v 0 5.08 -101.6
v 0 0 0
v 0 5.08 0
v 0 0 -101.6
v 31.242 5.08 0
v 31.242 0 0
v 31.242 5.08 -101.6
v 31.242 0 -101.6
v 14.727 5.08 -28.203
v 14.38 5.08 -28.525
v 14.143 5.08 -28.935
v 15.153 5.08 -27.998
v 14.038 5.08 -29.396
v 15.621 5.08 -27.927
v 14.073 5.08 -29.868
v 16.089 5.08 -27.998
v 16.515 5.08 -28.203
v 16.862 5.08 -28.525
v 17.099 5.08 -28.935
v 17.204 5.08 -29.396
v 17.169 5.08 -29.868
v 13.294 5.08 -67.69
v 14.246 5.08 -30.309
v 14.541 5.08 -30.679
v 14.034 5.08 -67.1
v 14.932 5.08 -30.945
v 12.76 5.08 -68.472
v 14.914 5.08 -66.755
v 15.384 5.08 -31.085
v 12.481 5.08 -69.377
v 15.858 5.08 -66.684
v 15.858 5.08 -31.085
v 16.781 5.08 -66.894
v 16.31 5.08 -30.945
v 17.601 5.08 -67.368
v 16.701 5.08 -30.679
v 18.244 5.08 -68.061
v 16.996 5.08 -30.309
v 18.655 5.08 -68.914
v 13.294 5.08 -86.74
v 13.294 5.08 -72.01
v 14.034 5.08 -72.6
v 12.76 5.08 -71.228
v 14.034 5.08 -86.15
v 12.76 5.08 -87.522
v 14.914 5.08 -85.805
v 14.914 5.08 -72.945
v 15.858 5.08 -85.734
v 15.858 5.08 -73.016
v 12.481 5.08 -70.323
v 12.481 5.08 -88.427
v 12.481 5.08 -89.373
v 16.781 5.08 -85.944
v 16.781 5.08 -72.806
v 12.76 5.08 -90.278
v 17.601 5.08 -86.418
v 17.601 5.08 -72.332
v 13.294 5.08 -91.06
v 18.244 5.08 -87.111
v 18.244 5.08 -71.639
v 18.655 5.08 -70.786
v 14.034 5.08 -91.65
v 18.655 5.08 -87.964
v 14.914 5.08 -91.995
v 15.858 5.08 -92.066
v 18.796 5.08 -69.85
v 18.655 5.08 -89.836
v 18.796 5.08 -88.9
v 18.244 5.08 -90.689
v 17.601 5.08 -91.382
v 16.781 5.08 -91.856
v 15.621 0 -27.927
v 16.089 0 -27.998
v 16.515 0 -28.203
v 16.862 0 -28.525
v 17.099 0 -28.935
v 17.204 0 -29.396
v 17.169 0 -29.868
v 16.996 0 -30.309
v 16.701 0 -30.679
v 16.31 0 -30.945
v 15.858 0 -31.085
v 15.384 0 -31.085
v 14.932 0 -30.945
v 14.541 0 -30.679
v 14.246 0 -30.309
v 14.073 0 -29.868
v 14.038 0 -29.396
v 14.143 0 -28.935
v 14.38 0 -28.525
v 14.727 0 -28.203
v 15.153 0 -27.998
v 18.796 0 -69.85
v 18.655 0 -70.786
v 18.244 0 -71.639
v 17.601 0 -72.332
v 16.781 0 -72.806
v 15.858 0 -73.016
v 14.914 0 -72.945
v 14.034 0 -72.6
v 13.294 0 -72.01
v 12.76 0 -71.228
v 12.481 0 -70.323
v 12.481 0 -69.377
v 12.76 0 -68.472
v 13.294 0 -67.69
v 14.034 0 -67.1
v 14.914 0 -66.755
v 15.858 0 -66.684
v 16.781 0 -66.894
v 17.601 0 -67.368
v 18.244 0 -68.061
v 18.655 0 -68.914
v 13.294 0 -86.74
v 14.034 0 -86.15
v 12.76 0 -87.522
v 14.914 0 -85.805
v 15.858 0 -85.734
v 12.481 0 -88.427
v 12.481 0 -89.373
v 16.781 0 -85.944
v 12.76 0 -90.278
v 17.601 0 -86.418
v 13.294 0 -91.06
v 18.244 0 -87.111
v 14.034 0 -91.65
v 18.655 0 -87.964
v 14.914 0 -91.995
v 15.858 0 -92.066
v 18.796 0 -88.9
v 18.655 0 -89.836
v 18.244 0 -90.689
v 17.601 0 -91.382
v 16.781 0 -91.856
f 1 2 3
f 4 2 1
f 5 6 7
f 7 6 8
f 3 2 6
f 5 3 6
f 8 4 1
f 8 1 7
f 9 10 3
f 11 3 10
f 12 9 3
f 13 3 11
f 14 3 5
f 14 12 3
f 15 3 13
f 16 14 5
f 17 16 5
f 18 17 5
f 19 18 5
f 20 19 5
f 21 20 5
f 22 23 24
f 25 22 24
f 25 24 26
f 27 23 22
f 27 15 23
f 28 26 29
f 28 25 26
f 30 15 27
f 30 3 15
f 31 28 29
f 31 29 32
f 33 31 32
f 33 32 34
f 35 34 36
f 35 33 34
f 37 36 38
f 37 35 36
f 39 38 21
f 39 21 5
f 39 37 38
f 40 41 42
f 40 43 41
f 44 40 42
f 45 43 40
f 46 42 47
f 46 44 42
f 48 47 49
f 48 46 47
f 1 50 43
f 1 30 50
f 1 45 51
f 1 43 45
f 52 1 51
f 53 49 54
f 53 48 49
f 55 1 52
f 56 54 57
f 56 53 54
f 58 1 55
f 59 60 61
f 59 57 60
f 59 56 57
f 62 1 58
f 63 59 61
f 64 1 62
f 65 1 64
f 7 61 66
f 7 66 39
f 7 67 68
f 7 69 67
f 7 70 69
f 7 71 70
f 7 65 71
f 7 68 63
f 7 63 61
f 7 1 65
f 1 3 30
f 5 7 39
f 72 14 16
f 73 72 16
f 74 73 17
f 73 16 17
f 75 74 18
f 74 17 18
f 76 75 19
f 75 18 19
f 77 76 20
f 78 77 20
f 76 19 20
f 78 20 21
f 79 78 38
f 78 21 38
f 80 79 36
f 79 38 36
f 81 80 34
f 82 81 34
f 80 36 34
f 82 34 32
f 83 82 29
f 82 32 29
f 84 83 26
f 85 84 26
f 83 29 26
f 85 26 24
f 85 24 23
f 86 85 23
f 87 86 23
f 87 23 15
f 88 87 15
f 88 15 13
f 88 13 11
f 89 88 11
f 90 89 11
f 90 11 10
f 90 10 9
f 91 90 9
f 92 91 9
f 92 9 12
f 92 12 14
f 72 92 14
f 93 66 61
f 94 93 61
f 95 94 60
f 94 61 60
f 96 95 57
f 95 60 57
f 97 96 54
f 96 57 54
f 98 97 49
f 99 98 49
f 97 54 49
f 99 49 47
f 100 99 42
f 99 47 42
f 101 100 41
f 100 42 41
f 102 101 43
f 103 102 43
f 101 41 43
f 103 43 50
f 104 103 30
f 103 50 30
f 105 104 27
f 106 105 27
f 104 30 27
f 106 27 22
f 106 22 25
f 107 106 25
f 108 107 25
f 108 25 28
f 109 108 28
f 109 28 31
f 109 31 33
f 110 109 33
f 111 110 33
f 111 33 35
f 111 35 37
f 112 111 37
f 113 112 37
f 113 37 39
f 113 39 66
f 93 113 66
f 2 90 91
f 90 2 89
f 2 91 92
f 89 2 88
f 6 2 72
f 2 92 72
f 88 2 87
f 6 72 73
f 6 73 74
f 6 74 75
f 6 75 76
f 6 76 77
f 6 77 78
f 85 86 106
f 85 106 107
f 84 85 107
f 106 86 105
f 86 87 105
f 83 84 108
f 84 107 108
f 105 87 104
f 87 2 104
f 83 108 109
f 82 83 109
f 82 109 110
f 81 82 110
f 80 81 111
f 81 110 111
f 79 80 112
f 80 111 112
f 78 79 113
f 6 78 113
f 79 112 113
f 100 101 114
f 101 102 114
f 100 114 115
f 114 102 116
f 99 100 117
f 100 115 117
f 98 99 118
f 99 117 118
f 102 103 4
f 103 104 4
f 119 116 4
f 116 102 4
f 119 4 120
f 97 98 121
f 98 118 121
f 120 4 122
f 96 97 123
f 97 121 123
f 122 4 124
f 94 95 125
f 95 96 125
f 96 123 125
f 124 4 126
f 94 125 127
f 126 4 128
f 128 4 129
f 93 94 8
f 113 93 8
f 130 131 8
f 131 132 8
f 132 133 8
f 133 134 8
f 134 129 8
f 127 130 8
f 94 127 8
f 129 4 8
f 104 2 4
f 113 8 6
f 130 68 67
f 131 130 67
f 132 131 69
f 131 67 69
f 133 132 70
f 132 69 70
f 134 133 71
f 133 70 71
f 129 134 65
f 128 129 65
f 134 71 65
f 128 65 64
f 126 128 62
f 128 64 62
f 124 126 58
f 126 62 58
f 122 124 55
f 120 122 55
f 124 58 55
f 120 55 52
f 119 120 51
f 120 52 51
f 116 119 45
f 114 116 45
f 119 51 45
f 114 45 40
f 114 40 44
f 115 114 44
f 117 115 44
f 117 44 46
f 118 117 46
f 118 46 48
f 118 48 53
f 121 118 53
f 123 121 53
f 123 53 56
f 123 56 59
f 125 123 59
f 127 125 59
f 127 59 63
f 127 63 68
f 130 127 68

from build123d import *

# Parameters (mm, degrees)
SKETCH1_W                   = 31.242
SKETCH1_H                   = 101.6
BOSS_EXTRUDE1_DEPTH         = 5.08
F_1_4_0_25_DIAMETER_HOLE1_D = 6.35
F_1_8_0_1250_DOWEL_HOLE1_D  = 3.175


with BuildPart() as part:
    # Sketch1 → Boss-Extrude1 (new body)
    with BuildSketch(Plane(origin=(0, 0, 0), x_dir=(1, 0, 0), z_dir=(0, 1, 0))):
        with Locations((15.621, 50.8)):
            Rectangle(SKETCH1_W, SKETCH1_H)
    extrude(amount=BOSS_EXTRUDE1_DEPTH)

    # 1/4 (0.25) Diameter Hole1 (through all)
    with Locations(Plane(origin=(0, 0, 0), x_dir=(-1, 0, 0), z_dir=(0, -1, 0))):
        with Locations((-15.621, 69.85), (-15.621, 88.9)):
            Hole(F_1_4_0_25_DIAMETER_HOLE1_D / 2)

    # 1/8 (0.1250) Dowel Hole1 (through all)
    with Locations(Plane(origin=(15.621, 0, -29.5148), x_dir=(0, 0, -1), z_dir=(0, -1, 0))):
        with Locations((0, 0)):
            Hole(F_1_8_0_1250_DOWEL_HOLE1_D / 2)


solid = part.part
